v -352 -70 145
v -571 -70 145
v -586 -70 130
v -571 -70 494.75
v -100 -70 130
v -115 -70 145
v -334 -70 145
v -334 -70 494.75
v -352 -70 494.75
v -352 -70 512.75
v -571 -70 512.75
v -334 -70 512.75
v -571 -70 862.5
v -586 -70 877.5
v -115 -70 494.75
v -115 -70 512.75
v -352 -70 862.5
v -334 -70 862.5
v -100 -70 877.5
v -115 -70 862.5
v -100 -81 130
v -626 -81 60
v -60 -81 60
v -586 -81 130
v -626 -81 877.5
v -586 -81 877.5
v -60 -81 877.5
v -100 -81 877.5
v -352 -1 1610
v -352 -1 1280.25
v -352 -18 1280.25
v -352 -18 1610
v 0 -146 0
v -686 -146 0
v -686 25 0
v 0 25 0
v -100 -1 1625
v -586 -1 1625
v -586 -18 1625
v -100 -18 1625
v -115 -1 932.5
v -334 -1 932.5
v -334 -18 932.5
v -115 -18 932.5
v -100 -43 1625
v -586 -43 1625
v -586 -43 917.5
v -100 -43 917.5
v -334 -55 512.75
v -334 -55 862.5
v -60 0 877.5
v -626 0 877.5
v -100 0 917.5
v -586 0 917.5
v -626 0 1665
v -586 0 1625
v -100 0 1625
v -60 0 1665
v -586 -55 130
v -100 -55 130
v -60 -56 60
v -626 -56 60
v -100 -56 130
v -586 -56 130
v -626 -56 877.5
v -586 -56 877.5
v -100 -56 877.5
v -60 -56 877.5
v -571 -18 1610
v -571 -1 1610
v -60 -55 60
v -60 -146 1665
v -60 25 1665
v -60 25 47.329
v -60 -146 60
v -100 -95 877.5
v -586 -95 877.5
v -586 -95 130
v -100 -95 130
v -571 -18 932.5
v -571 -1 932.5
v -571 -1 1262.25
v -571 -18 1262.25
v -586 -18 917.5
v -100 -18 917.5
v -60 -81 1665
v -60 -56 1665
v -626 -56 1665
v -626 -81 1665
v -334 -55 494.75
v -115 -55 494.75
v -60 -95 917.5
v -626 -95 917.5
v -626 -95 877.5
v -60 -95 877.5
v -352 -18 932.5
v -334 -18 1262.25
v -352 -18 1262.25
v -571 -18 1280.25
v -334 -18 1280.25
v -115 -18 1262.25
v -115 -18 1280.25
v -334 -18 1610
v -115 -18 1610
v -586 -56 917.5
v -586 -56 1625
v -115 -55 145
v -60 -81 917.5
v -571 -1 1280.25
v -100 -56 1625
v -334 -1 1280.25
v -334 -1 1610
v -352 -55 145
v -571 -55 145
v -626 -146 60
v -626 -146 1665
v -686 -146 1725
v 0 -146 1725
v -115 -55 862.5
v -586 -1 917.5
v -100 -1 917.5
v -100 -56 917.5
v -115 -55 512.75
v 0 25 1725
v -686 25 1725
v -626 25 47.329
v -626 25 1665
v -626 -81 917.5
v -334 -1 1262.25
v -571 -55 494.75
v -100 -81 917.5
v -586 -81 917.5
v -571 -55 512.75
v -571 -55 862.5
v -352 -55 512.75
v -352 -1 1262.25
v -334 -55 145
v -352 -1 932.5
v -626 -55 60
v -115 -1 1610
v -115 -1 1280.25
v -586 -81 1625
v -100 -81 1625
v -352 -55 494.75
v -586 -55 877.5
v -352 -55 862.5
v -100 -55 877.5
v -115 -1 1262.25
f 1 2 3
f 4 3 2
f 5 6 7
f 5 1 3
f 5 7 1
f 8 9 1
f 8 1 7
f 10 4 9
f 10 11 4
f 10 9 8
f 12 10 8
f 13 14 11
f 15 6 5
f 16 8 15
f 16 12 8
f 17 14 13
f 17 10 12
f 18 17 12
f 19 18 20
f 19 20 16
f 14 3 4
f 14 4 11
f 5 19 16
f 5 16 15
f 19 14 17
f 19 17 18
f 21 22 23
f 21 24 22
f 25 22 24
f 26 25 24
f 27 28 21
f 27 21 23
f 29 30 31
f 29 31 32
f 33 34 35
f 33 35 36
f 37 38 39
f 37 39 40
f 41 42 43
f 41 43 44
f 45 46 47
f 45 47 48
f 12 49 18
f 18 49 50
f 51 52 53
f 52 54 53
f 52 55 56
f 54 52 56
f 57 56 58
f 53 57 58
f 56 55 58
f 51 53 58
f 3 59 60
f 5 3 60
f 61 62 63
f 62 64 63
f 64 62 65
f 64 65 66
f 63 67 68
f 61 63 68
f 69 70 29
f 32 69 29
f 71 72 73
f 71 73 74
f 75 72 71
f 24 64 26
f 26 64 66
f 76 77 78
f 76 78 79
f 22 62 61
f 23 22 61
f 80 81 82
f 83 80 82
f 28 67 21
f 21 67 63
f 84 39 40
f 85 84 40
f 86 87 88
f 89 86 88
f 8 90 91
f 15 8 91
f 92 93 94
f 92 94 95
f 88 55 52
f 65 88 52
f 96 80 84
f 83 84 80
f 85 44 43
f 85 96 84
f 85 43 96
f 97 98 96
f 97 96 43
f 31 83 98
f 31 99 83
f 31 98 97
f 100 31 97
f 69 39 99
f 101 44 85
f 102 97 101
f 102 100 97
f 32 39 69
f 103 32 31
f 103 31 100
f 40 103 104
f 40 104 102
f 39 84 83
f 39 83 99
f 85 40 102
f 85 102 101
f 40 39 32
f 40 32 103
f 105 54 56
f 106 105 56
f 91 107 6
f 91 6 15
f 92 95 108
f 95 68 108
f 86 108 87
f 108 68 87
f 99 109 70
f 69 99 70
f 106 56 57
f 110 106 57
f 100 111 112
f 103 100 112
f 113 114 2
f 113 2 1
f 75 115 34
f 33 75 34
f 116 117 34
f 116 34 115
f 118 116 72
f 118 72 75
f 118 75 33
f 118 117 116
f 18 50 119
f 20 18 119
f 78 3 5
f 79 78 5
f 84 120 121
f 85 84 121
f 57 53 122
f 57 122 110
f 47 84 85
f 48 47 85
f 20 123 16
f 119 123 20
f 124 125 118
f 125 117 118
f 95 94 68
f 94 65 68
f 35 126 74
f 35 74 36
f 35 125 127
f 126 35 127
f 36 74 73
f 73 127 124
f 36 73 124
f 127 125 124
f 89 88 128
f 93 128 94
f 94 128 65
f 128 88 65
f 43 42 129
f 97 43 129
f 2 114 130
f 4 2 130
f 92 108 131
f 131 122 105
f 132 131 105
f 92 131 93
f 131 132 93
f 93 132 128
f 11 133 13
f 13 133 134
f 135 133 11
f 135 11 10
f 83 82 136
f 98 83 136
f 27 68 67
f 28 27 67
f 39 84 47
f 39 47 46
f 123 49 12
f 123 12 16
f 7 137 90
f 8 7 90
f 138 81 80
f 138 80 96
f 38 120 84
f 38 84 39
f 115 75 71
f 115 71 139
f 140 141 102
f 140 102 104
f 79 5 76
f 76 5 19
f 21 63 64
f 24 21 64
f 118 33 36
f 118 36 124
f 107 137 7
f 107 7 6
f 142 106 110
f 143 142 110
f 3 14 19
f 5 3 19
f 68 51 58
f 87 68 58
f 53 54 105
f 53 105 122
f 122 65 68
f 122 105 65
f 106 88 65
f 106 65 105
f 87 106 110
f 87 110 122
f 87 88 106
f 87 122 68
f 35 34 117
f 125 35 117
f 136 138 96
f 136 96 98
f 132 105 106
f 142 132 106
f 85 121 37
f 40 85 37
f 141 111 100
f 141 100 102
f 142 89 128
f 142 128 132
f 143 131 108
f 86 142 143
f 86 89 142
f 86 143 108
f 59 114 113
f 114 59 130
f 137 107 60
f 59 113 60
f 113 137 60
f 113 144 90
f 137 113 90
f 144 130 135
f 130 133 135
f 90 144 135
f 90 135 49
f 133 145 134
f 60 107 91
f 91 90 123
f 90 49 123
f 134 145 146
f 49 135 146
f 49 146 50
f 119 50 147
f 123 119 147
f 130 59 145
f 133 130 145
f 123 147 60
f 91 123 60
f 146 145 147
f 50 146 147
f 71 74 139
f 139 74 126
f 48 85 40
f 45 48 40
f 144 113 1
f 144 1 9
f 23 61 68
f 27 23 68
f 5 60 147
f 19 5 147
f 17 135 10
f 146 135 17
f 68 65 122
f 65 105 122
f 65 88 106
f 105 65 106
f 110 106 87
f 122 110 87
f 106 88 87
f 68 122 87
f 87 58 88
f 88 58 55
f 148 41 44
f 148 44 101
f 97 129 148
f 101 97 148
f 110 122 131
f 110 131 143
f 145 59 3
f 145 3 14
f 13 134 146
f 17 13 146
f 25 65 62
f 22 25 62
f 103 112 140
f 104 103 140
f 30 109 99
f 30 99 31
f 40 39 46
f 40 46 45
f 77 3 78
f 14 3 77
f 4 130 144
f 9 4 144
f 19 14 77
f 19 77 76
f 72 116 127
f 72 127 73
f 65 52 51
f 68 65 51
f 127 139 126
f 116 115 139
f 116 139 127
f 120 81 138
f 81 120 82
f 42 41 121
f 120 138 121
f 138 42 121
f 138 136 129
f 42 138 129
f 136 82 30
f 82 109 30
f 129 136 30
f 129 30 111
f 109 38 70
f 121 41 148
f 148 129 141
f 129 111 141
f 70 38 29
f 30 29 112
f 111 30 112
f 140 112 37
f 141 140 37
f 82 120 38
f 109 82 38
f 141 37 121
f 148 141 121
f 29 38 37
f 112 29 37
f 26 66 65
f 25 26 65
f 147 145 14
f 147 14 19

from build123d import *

# Parameters (mm, degrees)
F0_W          = 686
F0_H          = 1725
F1_DEPTH      = 146
F1_DEPTH_BACK = 25
F0_W_2        = 486
F0_H_2        = 707.5
F2_DEPTH      = 56
F3_START      = 56
F3_DEPTH      = 25
F4_START      = 1
F0_W_3        = 219
F0_H_3        = 329.75
F4_DEPTH      = 17
F6_START      = 55
F5_W          = 486
F5_H          = 747.5
F5_W_2        = 219
F5_H_2        = 349.75
F6_DEPTH      = 15
F7_SIZE2      = 12.670755226
F7_SIZE       = 80
F8_W          = 486
F8_H          = 747.5
F8_W_2        = 219
F8_H_2        = 349.75
F9_DEPTH      = 25
F10_DEPTH     = 25
F12_DEPTH     = 14
F13_W         = 486
F13_H         = 707.5
F13_W_2       = 219
F13_H_2       = 329.75
F14_DEPTH     = 25


with BuildPart() as f1:
    # F0 (on Front) → F1 (new body, two sides)
    with BuildSketch(Plane.XZ) as f1_sk:
        with Locations((-343, 862.5)):
            Rectangle(F0_W, F0_H)
        Polygon((-626, 1665), (-60, 1665), (-60, 877.5), (-60, 60), (-626, 60), (-626, 877.5), align=None, mode=Mode.SUBTRACT)
    extrude(amount=F1_DEPTH)
    extrude(f1_sk.sketch, amount=-F1_DEPTH_BACK)

    # F7
    f7_edges = [f1.edges().sort_by_distance(p)[0] for p in [
        (-343, 25, 60),
    ]]
    f7_side = f1.faces().sort_by_distance((-343, -60.5, 60))[0]
    chamfer(f7_edges, length=F7_SIZE, length2=F7_SIZE2, reference=f7_side)


with BuildPart() as f2:
    # F0 (on Front) → F2 (new body)
    with BuildSketch(Plane.XZ):
        Polygon((-60, 877.5), (-60, 1665), (-626, 1665), (-626, 877.5), (-586, 877.5), (-100, 877.5), align=None)
        with Locations((-343, 1271.25)):
            Rectangle(F0_W_2, F0_H_2, mode=Mode.SUBTRACT)
    extrude(amount=F2_DEPTH)


with BuildPart() as f3:
    # F0 (on Front) → F3 (new body)
    with BuildSketch(Plane.XZ.offset(F3_START)):
        Polygon((-60, 60), (-60, 877.5), (-100, 877.5), (-100, 130), (-586, 130), (-586, 877.5), (-626, 877.5), (-626, 60), align=None)
    extrude(amount=F3_DEPTH)


with BuildPart() as f4:
    # F0 (on Front) → F4 (new body)
    with BuildSketch(Plane.XZ.offset(F4_START)):
        with Locations((-343, 1271.25)):
            Rectangle(F0_W_2, F0_H_2)
        with Locations((-461.5, 1097.375)):
            Rectangle(F0_W_3, F0_H_3, mode=Mode.SUBTRACT)
        with Locations((-461.5, 1445.125)):
            Rectangle(F0_W_3, F0_H_3, mode=Mode.SUBTRACT)
        with Locations((-224.5, 1097.375)):
            Rectangle(F0_W_3, F0_H_3, mode=Mode.SUBTRACT)
        with Locations((-224.5, 1445.125)):
            Rectangle(F0_W_3, F0_H_3, mode=Mode.SUBTRACT)
    extrude(amount=F4_DEPTH)


with BuildPart() as f6:
    # F5 (on face) → F6 (new body)
    with BuildSketch(Plane.XZ.offset(F6_START)):
        with Locations((-343, 503.75)):
            Rectangle(F5_W, F5_H)
        with Locations((-461.5, 319.875)):
            Rectangle(F5_W_2, F5_H_2, mode=Mode.SUBTRACT)
        with Locations((-224.5, 319.875)):
            Rectangle(F5_W_2, F5_H_2, mode=Mode.SUBTRACT)
        with Locations((-461.5, 687.625)):
            Rectangle(F5_W_2, F5_H_2, mode=Mode.SUBTRACT)
        with Locations((-224.5, 687.625)):
            Rectangle(F5_W_2, F5_H_2, mode=Mode.SUBTRACT)
    extrude(amount=F6_DEPTH)


with BuildPart() as f9:
    # F8 (on face) → F9 (new body)
    with BuildSketch(Plane.XZ.offset(70)):
        with Locations((-343, 503.75)):
            Rectangle(F8_W, F8_H)
        with Locations((-461.5, 319.875)):
            Rectangle(F8_W_2, F8_H_2, mode=Mode.SUBTRACT)
        with Locations((-224.5, 319.875)):
            Rectangle(F8_W_2, F8_H_2, mode=Mode.SUBTRACT)
        with Locations((-461.5, 687.625)):
            Rectangle(F8_W_2, F8_H_2, mode=Mode.SUBTRACT)
        with Locations((-224.5, 687.625)):
            Rectangle(F8_W_2, F8_H_2, mode=Mode.SUBTRACT)
        with Locations((-461.5, 687.625)):
            Rectangle(F8_W_2, F8_H_2)
        with Locations((-224.5, 687.625)):
            Rectangle(F8_W_2, F8_H_2)
        with Locations((-461.5, 319.875)):
            Rectangle(F8_W_2, F8_H_2)
        with Locations((-224.5, 319.875)):
            Rectangle(F8_W_2, F8_H_2)
    extrude(amount=F9_DEPTH)


with BuildPart() as f10:
    # F10 (new): a face of the model
    f10_faces = [f2.part.faces().sort_by_distance(p)[0] for p in [
        (-69.6980010827, -56, 1271.25),
    ]]
    extrude(f10_faces, amount=F10_DEPTH)

    # F11 (on face) → F12 (join, through all)
    with BuildSketch(Plane.XZ.offset(81)):
        Polygon((-100, 917.5), (-586, 917.5), (-626, 917.5), (-626, 877.5), (-60, 877.5), (-60, 917.5), align=None)
    extrude(amount=F12_DEPTH)


with BuildPart() as f14:
    # F13 (on face) → F14 (new body)
    with BuildSketch(Plane.XZ.offset(18)):
        with Locations((-343, 1271.25)):
            Rectangle(F13_W, F13_H)
        with Locations((-461.5, 1097.375)):
            Rectangle(F13_W_2, F13_H_2, mode=Mode.SUBTRACT)
        with Locations((-224.5, 1097.375)):
            Rectangle(F13_W_2, F13_H_2, mode=Mode.SUBTRACT)
        with Locations((-461.5, 1445.125)):
            Rectangle(F13_W_2, F13_H_2, mode=Mode.SUBTRACT)
        with Locations((-224.5, 1445.125)):
            Rectangle(F13_W_2, F13_H_2, mode=Mode.SUBTRACT)
        with Locations((-224.5, 1097.375)):
            Rectangle(F13_W_2, F13_H_2)
        with Locations((-461.5, 1097.375)):
            Rectangle(F13_W_2, F13_H_2)
        with Locations((-461.5, 1445.125)):
            Rectangle(F13_W_2, F13_H_2)
        with Locations((-224.5, 1445.125)):
            Rectangle(F13_W_2, F13_H_2)
    extrude(amount=F14_DEPTH)


solid = Compound([f1.part, f2.part, f3.part, f4.part, f6.part, f9.part, f10.part, f14.part])
